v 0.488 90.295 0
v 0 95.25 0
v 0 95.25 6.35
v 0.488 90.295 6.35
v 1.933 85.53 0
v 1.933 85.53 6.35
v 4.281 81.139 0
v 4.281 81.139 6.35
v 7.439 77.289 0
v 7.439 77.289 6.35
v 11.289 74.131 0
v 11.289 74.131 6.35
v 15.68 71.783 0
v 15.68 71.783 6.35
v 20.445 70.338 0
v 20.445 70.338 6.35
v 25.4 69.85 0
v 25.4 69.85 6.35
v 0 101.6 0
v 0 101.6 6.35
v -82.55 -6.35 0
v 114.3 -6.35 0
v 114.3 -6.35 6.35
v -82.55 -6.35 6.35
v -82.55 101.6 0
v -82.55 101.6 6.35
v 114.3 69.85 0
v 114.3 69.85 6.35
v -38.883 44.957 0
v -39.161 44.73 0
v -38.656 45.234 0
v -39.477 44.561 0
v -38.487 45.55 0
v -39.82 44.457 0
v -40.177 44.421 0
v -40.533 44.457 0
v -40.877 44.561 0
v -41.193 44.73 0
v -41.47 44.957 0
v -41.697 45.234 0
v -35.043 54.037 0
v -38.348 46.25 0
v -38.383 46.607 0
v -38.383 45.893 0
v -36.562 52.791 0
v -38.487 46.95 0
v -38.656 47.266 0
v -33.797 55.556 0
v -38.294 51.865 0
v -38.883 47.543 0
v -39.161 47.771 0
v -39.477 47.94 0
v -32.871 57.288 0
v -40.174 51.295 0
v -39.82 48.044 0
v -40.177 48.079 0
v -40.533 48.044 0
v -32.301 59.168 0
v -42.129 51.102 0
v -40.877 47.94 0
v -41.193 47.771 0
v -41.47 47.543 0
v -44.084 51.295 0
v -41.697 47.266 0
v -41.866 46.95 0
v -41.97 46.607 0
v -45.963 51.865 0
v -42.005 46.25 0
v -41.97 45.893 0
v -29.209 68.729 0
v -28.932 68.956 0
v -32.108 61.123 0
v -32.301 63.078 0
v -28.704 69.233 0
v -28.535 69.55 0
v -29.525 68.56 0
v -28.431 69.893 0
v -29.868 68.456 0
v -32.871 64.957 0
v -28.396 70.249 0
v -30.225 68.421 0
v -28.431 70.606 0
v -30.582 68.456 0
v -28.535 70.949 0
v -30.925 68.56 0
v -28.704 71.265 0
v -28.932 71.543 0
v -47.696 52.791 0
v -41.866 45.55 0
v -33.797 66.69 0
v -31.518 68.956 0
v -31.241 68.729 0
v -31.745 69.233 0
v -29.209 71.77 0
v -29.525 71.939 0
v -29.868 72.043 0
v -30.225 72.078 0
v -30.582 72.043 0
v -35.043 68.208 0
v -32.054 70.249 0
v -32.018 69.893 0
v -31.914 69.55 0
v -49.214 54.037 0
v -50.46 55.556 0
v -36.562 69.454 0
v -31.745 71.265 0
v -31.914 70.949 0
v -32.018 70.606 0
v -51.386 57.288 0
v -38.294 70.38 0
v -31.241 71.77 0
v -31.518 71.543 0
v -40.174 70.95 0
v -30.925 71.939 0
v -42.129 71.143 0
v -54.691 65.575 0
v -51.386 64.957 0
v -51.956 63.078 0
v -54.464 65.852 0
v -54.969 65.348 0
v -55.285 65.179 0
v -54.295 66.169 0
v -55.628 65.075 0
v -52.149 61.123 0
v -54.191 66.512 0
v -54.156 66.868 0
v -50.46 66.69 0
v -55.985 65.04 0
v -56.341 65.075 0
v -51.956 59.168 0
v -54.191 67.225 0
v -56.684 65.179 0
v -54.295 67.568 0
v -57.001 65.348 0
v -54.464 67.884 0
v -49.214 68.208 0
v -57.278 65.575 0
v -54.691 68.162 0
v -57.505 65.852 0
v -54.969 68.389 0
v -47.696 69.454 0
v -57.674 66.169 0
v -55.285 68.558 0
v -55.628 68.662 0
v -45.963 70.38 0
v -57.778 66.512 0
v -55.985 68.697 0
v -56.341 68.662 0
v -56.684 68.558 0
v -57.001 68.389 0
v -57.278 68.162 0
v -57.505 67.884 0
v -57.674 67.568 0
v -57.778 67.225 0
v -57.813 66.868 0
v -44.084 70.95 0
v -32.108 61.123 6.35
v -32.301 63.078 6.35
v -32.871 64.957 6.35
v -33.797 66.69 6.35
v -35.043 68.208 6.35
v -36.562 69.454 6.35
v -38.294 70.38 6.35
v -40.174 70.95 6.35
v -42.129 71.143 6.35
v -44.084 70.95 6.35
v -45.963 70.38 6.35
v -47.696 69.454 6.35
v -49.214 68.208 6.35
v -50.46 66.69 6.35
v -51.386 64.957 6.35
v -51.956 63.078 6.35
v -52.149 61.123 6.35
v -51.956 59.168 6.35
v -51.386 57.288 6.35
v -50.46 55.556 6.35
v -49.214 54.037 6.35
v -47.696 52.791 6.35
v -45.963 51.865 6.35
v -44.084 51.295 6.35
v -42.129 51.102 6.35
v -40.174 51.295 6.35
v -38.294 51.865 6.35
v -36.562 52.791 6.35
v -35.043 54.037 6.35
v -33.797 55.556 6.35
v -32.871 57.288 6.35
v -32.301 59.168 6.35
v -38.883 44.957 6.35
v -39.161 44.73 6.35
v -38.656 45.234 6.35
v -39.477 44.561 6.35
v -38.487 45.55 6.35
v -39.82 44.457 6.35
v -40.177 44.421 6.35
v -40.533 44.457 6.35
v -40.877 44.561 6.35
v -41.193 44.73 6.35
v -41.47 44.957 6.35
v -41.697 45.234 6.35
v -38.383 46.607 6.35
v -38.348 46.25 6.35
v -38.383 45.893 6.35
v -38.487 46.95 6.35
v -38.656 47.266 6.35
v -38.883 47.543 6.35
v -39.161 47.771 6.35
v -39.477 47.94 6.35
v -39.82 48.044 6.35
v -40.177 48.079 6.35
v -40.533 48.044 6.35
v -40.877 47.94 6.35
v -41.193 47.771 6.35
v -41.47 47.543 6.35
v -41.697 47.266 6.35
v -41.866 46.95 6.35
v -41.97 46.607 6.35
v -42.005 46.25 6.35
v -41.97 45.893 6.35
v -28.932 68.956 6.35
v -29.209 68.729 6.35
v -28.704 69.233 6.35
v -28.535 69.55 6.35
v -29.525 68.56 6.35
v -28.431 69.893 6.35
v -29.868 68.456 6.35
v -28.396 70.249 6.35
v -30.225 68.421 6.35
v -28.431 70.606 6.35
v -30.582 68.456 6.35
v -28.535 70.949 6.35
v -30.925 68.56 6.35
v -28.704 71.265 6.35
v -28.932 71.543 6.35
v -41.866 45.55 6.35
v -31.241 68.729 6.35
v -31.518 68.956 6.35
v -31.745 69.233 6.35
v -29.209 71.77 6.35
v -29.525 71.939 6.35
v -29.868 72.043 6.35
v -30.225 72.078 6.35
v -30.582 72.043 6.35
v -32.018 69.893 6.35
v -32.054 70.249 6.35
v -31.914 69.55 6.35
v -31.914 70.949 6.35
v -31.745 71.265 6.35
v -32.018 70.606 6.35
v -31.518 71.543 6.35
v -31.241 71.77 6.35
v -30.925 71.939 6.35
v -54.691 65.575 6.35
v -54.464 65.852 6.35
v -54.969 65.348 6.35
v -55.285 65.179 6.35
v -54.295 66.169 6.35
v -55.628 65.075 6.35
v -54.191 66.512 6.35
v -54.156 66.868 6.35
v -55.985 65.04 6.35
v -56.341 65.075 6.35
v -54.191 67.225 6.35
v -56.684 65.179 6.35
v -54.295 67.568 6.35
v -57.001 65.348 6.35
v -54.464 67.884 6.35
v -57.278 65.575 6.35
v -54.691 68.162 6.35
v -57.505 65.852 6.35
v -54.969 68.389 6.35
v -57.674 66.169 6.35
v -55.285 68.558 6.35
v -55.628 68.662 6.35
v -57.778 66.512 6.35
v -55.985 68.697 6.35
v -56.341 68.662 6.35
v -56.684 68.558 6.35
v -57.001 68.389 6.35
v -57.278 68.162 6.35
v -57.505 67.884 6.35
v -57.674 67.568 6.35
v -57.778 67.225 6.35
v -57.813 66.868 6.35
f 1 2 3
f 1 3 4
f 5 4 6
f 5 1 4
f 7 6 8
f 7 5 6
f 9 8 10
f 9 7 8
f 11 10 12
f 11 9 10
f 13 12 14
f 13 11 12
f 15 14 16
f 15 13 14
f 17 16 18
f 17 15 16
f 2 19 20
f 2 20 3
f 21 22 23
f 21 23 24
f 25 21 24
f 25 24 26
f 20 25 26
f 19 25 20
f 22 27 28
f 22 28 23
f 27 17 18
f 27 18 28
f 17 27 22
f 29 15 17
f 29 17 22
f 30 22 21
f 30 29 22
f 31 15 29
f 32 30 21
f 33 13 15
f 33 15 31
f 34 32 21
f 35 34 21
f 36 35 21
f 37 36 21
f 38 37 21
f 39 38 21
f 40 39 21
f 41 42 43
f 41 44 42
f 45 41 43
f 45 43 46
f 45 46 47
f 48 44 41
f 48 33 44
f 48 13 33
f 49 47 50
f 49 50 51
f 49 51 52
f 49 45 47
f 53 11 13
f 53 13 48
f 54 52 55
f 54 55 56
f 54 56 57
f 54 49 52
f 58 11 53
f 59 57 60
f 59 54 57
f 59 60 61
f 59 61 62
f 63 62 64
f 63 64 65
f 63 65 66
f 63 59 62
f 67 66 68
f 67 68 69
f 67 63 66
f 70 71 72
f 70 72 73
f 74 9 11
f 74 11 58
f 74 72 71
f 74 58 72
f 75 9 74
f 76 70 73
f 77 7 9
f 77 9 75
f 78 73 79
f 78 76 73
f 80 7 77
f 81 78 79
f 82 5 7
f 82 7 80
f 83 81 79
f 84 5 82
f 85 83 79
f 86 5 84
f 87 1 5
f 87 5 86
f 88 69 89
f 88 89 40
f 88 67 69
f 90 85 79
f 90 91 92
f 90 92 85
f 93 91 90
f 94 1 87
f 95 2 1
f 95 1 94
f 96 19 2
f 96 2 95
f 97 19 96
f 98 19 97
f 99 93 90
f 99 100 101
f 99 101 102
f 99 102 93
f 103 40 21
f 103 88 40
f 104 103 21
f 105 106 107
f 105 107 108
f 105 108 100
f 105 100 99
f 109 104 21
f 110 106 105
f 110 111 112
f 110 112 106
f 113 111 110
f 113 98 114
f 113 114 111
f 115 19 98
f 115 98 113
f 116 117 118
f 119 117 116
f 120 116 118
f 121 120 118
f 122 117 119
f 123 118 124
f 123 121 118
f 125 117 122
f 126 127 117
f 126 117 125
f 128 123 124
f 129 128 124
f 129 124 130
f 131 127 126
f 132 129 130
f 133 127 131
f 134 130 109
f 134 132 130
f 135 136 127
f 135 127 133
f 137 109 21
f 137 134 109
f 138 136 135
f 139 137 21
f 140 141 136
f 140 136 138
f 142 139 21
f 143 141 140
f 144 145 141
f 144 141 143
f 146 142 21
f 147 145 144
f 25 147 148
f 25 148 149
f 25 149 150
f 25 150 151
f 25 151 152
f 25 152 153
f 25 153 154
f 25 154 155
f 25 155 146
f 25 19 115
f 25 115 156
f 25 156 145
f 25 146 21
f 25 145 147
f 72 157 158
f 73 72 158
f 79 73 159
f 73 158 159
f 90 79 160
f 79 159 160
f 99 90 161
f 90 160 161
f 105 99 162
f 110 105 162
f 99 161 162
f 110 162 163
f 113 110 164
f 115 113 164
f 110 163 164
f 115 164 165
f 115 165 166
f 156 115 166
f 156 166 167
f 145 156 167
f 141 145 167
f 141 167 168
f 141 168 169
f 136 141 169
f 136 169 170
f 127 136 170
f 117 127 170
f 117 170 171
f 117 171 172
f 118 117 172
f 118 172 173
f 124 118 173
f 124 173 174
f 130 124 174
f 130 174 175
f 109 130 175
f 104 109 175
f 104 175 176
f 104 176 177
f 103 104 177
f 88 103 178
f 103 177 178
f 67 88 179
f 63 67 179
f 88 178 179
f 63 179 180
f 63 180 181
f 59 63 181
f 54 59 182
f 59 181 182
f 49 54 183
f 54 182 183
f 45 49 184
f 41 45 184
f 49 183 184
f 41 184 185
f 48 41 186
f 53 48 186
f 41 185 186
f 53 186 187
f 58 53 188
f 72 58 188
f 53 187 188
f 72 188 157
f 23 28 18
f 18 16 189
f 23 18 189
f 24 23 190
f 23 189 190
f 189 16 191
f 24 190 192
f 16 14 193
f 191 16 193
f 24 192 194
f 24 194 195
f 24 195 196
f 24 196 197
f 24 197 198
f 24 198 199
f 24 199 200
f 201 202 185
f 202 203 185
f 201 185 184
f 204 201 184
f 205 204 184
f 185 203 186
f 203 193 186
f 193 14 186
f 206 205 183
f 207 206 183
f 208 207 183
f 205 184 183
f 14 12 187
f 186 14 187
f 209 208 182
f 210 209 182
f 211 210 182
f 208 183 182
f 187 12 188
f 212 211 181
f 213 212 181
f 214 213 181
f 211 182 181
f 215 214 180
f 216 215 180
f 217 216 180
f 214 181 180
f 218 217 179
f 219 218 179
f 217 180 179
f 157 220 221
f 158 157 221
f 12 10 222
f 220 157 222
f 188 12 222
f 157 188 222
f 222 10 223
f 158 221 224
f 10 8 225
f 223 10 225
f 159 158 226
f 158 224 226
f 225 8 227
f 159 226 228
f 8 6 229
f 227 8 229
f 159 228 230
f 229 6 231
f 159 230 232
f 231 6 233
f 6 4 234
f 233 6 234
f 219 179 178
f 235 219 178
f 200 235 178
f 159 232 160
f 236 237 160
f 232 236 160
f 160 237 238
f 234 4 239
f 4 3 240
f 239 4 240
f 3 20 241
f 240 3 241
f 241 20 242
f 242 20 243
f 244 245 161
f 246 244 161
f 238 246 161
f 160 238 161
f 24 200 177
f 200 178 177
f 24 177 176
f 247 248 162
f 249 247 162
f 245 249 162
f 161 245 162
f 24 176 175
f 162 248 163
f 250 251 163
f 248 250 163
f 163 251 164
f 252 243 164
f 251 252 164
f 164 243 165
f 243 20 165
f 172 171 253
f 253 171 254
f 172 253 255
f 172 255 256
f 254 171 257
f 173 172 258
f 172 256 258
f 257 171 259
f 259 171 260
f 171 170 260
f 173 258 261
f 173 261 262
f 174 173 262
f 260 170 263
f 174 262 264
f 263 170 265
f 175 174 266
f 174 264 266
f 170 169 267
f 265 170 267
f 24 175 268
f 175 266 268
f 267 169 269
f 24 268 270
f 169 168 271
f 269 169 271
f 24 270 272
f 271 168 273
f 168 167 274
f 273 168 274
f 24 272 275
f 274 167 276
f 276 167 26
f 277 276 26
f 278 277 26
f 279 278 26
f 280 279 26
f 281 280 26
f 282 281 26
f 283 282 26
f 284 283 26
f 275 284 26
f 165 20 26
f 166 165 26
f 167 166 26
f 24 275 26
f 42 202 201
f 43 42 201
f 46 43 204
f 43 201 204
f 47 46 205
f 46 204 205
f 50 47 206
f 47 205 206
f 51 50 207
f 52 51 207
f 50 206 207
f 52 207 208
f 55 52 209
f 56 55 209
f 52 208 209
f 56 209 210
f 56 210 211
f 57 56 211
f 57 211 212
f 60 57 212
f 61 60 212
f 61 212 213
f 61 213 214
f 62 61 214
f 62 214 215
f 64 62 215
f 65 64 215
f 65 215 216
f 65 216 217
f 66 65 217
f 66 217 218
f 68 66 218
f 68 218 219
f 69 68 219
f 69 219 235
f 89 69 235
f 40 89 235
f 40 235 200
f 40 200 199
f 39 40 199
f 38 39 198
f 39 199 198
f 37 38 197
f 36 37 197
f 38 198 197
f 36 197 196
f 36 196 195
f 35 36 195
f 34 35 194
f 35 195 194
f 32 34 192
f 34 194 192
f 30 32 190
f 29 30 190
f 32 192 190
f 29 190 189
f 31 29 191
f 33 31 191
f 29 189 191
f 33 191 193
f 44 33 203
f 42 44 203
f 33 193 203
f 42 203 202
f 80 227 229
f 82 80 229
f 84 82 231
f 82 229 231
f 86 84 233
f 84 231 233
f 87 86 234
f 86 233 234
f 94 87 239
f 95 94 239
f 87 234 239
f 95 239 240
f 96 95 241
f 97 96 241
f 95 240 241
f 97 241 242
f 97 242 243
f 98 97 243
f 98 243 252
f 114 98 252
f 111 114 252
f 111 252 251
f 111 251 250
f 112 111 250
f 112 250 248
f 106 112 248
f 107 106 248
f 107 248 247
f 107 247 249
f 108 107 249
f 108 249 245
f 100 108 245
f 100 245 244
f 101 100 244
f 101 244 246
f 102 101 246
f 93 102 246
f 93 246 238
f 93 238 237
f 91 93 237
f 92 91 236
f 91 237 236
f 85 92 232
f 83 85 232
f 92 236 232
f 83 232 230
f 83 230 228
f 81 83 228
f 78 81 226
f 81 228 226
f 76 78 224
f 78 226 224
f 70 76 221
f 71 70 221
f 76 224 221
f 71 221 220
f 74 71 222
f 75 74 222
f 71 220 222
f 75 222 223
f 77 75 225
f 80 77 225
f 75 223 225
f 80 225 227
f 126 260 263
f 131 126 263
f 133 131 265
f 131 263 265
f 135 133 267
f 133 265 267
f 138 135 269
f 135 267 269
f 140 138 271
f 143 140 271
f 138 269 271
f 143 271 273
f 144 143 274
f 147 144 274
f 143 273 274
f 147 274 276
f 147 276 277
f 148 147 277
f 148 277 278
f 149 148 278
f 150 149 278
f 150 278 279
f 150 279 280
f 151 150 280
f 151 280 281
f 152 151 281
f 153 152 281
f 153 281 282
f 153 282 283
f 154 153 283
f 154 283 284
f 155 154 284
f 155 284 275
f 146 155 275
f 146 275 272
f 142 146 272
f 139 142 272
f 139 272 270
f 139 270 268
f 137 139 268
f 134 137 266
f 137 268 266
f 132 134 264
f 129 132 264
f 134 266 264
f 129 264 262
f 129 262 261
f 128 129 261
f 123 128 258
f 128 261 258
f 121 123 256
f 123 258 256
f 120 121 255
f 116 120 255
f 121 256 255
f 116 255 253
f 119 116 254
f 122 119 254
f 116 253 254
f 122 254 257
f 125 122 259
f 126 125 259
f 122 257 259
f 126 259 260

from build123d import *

# Parameters (mm, degrees)
BOSS_EXTRUDE1_DEPTH = 6.35
SKETCH4_R           = 10.0203
SKETCH4_R_2         = 1.8288
CUT_EXTRUDE3_DEPTH  = 154.060029074


with BuildPart() as part:
    # Sketch2 → Boss-Extrude1 (new body)
    with BuildSketch(Plane.XY):
        with BuildLine():
            Line((-82.55, -6.35), (-82.55, 101.6))
            Line((-82.55, 101.6), (0, 101.6))
            Line((0, 101.6), (0, 95.25))
            ThreePointArc((0, 95.25), (7.439487758, 77.289487758), (25.4, 69.85))
            Line((25.4, 69.85), (114.3, 69.85))
            Line((114.3, 69.85), (114.3, -6.35))
            Line((114.3, -6.35), (-82.55, -6.35))
        make_face()
    extrude(amount=BOSS_EXTRUDE1_DEPTH)

    # Sketch4 → Cut-Extrude3 (cut, through all)
    with BuildSketch(Plane.XY.offset(6.35)):
        with Locations((-42.128660063, 61.122671242)):
            Circle(SKETCH4_R)
        with Locations((-30.224747325, 70.249382672)):
            Circle(SKETCH4_R_2)
        with Locations((-55.984580384, 66.868406363)):
            Circle(SKETCH4_R_2)
        with Locations((-40.176652481, 46.250224691)):
            Circle(SKETCH4_R_2)
    extrude(amount=-CUT_EXTRUDE3_DEPTH, mode=Mode.SUBTRACT)


solid = part.part
